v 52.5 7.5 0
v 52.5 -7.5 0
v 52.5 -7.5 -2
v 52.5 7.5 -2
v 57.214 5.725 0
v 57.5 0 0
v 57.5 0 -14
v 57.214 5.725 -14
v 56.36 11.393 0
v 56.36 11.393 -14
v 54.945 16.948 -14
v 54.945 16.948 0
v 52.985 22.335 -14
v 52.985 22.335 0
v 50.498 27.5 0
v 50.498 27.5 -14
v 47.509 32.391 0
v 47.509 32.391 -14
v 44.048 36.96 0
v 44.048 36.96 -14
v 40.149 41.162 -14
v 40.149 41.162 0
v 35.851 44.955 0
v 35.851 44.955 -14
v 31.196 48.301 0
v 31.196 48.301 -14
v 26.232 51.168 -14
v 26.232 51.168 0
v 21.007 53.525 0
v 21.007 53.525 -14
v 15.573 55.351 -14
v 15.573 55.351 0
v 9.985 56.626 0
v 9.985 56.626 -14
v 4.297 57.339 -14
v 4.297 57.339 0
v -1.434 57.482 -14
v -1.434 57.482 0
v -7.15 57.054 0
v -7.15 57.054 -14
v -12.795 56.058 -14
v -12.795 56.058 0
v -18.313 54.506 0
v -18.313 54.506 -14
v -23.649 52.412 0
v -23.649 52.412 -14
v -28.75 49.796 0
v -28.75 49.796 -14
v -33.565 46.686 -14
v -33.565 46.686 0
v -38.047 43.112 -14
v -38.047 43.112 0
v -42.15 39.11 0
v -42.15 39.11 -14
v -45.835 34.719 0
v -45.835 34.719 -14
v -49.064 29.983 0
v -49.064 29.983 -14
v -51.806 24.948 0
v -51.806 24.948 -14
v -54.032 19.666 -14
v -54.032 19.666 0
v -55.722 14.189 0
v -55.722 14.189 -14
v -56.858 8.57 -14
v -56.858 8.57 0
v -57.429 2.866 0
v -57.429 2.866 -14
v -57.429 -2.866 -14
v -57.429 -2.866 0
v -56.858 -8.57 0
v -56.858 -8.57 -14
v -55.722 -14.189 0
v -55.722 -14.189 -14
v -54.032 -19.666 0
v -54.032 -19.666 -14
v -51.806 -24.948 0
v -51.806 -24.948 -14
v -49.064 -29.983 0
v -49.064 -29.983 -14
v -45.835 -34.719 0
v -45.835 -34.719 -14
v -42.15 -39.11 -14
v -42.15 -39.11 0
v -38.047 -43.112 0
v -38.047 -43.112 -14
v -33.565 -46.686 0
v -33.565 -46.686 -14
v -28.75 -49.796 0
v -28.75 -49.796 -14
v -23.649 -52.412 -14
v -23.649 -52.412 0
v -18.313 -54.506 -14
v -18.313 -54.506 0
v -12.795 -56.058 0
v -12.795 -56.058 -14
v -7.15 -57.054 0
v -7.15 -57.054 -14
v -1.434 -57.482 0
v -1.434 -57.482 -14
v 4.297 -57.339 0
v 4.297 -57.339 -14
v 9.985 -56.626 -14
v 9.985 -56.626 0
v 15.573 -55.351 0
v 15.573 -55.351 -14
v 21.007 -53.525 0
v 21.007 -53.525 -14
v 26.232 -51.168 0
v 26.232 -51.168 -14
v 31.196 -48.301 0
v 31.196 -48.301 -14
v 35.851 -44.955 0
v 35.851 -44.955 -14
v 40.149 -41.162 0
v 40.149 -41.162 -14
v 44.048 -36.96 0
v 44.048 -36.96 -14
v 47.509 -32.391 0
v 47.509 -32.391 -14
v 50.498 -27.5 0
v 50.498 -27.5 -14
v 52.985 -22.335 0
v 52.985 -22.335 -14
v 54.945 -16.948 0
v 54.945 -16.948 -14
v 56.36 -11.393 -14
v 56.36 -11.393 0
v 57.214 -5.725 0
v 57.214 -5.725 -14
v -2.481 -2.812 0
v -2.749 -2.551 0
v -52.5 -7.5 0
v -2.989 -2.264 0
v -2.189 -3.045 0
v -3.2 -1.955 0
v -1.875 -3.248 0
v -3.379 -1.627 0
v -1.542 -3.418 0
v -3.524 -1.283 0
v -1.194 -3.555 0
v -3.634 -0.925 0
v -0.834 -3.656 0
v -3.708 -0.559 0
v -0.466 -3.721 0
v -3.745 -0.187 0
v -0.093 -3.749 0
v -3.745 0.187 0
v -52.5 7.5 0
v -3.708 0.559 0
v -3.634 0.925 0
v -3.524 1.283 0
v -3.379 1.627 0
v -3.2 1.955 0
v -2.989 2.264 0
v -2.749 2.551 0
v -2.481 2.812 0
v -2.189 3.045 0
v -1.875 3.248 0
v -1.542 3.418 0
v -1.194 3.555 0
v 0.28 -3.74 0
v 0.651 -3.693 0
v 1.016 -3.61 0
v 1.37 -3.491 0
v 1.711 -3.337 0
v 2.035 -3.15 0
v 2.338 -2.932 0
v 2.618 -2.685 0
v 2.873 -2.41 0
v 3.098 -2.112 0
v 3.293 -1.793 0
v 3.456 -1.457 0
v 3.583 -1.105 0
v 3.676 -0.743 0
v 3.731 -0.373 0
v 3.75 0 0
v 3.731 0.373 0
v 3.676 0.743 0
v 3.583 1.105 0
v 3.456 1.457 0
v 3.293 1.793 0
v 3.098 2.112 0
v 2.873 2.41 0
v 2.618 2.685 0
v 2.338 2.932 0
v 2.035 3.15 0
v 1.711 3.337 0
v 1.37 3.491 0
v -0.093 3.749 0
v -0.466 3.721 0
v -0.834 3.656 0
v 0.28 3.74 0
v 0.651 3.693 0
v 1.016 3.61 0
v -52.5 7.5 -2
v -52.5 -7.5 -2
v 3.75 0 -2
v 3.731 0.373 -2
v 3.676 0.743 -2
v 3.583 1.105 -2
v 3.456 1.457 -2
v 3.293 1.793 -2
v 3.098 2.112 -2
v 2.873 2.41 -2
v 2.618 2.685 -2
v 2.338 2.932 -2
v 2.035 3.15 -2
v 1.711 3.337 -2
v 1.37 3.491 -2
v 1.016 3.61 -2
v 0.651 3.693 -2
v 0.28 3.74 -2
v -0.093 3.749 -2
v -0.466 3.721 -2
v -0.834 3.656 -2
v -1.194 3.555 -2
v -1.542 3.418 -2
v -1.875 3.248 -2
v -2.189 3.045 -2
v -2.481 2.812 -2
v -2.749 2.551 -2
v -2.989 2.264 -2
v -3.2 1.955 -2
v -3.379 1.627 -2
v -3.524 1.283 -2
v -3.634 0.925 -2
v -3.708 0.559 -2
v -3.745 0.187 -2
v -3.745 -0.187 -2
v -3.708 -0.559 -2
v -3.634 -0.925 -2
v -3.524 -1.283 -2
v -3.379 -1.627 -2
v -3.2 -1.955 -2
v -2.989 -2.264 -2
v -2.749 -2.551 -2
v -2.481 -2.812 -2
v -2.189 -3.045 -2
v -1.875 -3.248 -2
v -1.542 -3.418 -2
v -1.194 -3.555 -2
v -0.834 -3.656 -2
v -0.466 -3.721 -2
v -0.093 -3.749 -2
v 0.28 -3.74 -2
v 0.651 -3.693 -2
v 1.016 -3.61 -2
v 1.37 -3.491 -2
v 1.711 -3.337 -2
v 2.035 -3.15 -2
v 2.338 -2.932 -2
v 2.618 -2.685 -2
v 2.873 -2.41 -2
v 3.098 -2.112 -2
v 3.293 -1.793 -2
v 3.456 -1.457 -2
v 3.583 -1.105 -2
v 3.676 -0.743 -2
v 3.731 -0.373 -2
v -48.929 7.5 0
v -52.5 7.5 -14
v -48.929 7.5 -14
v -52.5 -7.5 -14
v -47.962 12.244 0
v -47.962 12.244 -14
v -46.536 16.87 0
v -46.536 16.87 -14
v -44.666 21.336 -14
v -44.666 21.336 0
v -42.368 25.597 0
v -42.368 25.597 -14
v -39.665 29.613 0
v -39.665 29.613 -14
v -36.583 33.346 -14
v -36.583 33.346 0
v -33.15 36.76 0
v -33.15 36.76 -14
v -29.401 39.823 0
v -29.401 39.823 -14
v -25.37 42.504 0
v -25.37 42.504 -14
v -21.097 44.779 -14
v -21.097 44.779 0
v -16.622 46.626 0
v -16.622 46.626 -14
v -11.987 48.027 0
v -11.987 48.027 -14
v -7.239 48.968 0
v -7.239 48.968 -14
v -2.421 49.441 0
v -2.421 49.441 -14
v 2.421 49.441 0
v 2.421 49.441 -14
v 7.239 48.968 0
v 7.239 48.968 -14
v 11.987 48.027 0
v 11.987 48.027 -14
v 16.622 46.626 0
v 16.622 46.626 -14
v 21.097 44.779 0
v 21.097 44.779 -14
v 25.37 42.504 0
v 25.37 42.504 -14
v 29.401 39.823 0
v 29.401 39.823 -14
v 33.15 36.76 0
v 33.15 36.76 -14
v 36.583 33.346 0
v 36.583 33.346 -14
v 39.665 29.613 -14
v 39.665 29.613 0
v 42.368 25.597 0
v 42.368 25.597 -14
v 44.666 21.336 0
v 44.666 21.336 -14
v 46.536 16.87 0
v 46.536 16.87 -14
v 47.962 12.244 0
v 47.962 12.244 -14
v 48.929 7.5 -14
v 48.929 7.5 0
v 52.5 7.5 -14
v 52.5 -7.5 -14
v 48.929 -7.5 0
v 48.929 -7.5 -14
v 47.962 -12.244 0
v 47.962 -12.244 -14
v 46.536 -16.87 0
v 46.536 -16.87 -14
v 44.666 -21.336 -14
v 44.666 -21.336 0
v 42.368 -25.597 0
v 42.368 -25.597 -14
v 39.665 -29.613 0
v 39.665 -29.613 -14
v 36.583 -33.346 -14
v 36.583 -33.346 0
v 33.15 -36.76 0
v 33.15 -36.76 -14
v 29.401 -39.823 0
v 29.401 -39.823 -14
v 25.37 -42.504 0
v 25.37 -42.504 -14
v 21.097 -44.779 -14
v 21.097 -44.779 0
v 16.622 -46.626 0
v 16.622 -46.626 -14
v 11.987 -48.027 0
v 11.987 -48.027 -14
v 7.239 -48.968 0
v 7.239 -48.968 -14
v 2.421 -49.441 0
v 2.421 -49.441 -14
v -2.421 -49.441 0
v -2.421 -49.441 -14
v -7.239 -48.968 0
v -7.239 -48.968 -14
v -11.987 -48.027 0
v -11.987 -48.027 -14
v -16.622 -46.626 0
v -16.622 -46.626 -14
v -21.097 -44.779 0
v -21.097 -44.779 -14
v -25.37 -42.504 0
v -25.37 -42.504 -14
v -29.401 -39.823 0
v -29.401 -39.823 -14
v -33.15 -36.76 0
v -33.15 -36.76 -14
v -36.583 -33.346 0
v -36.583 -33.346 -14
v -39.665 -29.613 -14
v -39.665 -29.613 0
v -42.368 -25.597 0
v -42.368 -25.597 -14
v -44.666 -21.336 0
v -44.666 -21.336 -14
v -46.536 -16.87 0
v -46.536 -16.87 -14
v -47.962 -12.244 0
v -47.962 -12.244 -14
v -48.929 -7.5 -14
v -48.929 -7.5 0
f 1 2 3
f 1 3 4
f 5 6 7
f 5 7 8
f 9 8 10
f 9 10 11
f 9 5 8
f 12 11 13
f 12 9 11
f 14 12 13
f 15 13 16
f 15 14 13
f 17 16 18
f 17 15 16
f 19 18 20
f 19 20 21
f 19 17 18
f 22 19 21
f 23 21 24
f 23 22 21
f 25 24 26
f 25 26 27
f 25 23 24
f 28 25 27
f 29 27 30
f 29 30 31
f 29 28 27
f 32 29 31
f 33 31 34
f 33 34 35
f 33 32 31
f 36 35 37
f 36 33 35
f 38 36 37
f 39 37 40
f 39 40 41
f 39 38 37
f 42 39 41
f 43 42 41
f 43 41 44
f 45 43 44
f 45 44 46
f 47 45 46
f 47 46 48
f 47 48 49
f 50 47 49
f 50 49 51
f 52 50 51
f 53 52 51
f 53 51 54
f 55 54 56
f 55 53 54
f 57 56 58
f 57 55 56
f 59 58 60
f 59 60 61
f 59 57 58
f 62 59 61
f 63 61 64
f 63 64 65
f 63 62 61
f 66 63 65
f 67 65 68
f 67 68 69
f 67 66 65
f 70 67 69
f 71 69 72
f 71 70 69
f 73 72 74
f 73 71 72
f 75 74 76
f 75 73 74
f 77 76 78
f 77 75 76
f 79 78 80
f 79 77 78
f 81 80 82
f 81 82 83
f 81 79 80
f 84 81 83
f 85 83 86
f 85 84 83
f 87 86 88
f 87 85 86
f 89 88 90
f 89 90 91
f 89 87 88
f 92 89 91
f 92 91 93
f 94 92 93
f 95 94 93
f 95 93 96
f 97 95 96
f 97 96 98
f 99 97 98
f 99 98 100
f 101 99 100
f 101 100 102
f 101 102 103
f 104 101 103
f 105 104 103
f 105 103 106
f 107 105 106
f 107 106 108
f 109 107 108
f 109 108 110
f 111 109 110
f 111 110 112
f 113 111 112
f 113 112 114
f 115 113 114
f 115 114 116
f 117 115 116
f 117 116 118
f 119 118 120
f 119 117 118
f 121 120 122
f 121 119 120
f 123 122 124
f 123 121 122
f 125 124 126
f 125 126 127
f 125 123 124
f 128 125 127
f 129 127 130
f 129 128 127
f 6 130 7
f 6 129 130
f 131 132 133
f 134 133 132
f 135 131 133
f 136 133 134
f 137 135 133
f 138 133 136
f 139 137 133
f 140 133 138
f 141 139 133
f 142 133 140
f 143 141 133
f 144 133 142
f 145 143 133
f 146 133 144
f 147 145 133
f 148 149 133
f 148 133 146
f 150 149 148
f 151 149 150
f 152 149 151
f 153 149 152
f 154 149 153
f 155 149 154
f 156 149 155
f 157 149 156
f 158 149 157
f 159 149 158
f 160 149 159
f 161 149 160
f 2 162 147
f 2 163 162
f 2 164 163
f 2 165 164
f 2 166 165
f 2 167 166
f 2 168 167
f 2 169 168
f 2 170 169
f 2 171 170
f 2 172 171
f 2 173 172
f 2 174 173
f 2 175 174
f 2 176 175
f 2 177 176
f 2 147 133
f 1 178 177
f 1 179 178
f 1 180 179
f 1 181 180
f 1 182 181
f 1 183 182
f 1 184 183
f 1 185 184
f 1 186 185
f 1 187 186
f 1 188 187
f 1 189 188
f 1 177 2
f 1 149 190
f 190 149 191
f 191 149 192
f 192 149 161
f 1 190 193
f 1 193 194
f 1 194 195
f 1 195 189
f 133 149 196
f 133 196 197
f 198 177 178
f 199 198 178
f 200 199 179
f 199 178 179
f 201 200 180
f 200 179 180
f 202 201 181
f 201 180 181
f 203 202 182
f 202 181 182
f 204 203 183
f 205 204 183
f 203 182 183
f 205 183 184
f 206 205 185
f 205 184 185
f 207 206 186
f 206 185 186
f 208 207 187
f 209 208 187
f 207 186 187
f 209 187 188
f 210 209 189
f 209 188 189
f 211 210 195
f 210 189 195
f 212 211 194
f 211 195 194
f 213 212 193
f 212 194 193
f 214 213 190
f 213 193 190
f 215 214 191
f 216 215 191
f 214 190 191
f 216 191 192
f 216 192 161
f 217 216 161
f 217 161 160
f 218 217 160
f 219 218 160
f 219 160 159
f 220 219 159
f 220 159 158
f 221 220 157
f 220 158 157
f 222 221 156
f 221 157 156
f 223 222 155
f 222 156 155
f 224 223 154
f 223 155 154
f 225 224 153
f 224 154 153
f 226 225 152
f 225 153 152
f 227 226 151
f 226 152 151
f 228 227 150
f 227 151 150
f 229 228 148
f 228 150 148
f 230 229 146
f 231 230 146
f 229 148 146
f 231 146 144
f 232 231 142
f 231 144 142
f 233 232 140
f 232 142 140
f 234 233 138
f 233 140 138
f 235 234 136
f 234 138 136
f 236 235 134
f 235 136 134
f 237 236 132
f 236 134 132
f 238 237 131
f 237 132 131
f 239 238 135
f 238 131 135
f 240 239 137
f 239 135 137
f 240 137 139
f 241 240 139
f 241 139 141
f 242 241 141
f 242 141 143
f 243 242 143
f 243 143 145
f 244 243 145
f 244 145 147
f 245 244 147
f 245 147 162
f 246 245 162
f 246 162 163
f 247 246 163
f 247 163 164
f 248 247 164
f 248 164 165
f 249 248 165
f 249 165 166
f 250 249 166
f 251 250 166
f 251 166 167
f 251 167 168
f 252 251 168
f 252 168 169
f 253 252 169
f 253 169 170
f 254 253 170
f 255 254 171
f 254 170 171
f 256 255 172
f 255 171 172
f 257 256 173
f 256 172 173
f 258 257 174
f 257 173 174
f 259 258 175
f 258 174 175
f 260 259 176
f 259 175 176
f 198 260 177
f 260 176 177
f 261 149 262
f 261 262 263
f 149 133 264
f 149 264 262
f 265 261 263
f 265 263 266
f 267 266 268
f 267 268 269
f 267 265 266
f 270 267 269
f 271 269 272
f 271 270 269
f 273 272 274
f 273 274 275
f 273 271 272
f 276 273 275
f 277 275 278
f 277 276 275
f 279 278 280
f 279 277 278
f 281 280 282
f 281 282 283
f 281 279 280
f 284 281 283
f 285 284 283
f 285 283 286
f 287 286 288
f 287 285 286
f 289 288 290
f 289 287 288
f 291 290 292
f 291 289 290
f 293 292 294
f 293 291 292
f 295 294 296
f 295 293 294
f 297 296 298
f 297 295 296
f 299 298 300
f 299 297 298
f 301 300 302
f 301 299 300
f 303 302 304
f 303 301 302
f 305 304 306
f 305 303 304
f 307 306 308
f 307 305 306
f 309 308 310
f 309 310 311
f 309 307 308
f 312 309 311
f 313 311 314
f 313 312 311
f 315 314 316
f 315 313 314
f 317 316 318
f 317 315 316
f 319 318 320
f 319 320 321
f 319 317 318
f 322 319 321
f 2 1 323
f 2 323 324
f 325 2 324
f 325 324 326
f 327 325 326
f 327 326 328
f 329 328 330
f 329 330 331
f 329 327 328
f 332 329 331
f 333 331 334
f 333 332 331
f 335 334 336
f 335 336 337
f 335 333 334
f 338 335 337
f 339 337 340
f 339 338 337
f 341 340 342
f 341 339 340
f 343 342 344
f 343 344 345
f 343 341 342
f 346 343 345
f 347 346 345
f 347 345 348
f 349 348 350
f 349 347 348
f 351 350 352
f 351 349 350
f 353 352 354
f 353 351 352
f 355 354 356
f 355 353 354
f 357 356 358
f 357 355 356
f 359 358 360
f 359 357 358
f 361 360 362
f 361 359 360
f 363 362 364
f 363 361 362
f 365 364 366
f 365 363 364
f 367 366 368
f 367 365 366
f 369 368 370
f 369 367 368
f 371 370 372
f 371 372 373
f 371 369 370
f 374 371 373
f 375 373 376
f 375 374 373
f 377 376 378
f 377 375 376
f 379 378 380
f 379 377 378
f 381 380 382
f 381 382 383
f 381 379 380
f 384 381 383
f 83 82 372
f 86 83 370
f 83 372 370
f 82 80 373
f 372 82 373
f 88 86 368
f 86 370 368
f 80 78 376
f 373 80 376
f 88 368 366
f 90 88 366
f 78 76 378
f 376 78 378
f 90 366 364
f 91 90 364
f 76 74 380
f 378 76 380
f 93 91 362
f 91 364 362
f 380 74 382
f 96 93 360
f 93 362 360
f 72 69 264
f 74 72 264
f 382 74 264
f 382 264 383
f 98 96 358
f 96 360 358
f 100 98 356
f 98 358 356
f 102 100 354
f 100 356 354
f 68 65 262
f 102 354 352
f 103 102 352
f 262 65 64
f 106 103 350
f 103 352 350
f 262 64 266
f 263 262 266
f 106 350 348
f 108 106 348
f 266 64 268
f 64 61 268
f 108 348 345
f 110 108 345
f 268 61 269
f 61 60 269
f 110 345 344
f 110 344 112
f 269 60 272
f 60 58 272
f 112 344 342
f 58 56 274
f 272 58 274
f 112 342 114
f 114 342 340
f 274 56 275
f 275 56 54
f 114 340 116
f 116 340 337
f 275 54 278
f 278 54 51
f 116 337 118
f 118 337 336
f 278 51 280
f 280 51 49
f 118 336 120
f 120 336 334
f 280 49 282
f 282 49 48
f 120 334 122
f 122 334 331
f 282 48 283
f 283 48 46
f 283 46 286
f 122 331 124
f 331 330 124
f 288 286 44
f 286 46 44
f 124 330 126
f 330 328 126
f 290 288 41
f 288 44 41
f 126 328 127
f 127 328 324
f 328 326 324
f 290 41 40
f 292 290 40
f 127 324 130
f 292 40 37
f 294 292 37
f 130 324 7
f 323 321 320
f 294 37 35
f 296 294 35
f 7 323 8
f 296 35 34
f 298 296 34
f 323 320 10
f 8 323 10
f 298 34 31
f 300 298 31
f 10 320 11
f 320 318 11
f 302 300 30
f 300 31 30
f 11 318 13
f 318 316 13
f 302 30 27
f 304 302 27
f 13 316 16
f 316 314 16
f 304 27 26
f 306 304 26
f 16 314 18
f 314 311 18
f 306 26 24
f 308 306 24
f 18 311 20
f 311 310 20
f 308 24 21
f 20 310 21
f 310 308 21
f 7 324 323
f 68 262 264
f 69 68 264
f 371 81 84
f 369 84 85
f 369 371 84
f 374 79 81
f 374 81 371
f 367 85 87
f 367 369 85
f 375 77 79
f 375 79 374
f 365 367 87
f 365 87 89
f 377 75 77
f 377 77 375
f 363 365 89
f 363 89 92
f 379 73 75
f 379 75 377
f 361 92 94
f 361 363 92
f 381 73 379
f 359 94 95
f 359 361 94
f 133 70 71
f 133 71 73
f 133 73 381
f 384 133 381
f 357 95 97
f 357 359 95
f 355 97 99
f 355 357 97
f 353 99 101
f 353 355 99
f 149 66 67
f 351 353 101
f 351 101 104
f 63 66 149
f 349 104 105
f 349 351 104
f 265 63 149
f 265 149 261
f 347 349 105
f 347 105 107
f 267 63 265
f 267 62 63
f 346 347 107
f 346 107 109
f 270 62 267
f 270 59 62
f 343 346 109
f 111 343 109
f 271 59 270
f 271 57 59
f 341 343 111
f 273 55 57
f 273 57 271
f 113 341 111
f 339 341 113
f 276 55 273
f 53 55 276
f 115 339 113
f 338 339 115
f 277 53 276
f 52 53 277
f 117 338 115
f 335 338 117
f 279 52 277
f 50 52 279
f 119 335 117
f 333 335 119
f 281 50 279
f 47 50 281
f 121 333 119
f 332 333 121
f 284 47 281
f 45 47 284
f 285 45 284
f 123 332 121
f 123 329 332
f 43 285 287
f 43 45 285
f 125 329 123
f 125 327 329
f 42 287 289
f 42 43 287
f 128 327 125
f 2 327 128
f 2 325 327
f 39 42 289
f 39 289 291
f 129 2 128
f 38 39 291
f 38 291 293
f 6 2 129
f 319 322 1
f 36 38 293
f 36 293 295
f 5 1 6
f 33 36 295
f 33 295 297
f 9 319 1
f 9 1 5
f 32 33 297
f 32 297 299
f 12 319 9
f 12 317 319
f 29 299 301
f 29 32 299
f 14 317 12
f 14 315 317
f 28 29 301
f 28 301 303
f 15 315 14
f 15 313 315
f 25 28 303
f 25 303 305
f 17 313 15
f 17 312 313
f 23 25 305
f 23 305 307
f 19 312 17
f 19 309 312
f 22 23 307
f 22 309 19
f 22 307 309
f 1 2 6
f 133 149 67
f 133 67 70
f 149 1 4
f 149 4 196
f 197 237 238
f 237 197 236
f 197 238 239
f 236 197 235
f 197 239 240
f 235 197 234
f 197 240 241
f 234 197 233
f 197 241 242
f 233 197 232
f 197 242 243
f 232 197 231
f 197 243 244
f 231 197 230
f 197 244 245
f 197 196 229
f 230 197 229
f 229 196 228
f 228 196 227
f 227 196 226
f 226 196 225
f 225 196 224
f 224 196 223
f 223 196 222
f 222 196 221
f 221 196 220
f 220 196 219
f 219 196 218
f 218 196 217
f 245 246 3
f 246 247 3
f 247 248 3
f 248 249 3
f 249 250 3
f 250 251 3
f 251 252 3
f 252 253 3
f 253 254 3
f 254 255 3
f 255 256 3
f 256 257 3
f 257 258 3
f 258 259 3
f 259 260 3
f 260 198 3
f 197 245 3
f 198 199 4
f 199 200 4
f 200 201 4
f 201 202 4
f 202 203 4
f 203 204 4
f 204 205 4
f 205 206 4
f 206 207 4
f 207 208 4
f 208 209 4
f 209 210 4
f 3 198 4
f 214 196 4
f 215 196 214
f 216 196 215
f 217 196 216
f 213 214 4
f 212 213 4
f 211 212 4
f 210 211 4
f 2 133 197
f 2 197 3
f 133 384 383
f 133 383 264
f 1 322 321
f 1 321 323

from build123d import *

# Parameters (mm, degrees)
F0_R     = 57.5
F1_DEPTH = 14
F0_R_2   = 3.75
F2_DEPTH = 2


with BuildPart() as f1:
    # F0 (on Top) → F1 (new body)
    with BuildSketch(Plane.XY):
        Circle(F0_R)
        with BuildLine():
            ThreePointArc((-48.928519, 7.5), (0, 49.5), (48.928519, 7.5))
            Line((48.928519, 7.5), (52.5, 7.5))
            Line((52.5, 7.5), (52.5, -7.5))
            Line((52.5, -7.5), (48.928519, -7.5))
            ThreePointArc((48.928519, -7.5), (0, -49.5), (-48.928519, -7.5))
            Line((-48.928519, -7.5), (-52.5, -7.5))
            Line((-52.5, -7.5), (-52.5, 7.5))
            Line((-52.5, 7.5), (-48.928519, 7.5))
        make_face(mode=Mode.SUBTRACT)
    extrude(amount=-F1_DEPTH)


with BuildPart() as f2:
    # F0 (on Top) → F2 (new body)
    with BuildSketch(Plane.XY):
        with BuildLine():
            ThreePointArc((-48.928519, -7.5), (-49.5, 0), (-48.928519, 7.5))
            Line((-48.928519, 7.5), (-52.5, 7.5))
            Line((-52.5, 7.5), (-52.5, -7.5))
            Line((-52.5, -7.5), (-48.928519, -7.5))
        make_face()
        with BuildLine():
            ThreePointArc((48.928519, -7.5), (49.356923, -3.760871), (49.5, 0))
            ThreePointArc((49.5, 0), (49.356923, 3.760871), (48.928519, 7.5))
            Line((48.928519, 7.5), (-48.928519, 7.5))
            ThreePointArc((-48.928519, 7.5), (-49.5, 0), (-48.928519, -7.5))
            Line((-48.928519, -7.5), (48.928519, -7.5))
        make_face()
        Circle(F0_R_2, mode=Mode.SUBTRACT)
        with BuildLine():
            ThreePointArc((48.928519, 7.5), (49.356923, 3.760871), (49.5, 0))
            ThreePointArc((49.5, 0), (49.356923, -3.760871), (48.928519, -7.5))
            Line((48.928519, -7.5), (52.5, -7.5))
            Line((52.5, -7.5), (52.5, 7.5))
            Line((52.5, 7.5), (48.928519, 7.5))
        make_face()
    extrude(amount=-F2_DEPTH)


solid = Compound([f1.part, f2.part])
